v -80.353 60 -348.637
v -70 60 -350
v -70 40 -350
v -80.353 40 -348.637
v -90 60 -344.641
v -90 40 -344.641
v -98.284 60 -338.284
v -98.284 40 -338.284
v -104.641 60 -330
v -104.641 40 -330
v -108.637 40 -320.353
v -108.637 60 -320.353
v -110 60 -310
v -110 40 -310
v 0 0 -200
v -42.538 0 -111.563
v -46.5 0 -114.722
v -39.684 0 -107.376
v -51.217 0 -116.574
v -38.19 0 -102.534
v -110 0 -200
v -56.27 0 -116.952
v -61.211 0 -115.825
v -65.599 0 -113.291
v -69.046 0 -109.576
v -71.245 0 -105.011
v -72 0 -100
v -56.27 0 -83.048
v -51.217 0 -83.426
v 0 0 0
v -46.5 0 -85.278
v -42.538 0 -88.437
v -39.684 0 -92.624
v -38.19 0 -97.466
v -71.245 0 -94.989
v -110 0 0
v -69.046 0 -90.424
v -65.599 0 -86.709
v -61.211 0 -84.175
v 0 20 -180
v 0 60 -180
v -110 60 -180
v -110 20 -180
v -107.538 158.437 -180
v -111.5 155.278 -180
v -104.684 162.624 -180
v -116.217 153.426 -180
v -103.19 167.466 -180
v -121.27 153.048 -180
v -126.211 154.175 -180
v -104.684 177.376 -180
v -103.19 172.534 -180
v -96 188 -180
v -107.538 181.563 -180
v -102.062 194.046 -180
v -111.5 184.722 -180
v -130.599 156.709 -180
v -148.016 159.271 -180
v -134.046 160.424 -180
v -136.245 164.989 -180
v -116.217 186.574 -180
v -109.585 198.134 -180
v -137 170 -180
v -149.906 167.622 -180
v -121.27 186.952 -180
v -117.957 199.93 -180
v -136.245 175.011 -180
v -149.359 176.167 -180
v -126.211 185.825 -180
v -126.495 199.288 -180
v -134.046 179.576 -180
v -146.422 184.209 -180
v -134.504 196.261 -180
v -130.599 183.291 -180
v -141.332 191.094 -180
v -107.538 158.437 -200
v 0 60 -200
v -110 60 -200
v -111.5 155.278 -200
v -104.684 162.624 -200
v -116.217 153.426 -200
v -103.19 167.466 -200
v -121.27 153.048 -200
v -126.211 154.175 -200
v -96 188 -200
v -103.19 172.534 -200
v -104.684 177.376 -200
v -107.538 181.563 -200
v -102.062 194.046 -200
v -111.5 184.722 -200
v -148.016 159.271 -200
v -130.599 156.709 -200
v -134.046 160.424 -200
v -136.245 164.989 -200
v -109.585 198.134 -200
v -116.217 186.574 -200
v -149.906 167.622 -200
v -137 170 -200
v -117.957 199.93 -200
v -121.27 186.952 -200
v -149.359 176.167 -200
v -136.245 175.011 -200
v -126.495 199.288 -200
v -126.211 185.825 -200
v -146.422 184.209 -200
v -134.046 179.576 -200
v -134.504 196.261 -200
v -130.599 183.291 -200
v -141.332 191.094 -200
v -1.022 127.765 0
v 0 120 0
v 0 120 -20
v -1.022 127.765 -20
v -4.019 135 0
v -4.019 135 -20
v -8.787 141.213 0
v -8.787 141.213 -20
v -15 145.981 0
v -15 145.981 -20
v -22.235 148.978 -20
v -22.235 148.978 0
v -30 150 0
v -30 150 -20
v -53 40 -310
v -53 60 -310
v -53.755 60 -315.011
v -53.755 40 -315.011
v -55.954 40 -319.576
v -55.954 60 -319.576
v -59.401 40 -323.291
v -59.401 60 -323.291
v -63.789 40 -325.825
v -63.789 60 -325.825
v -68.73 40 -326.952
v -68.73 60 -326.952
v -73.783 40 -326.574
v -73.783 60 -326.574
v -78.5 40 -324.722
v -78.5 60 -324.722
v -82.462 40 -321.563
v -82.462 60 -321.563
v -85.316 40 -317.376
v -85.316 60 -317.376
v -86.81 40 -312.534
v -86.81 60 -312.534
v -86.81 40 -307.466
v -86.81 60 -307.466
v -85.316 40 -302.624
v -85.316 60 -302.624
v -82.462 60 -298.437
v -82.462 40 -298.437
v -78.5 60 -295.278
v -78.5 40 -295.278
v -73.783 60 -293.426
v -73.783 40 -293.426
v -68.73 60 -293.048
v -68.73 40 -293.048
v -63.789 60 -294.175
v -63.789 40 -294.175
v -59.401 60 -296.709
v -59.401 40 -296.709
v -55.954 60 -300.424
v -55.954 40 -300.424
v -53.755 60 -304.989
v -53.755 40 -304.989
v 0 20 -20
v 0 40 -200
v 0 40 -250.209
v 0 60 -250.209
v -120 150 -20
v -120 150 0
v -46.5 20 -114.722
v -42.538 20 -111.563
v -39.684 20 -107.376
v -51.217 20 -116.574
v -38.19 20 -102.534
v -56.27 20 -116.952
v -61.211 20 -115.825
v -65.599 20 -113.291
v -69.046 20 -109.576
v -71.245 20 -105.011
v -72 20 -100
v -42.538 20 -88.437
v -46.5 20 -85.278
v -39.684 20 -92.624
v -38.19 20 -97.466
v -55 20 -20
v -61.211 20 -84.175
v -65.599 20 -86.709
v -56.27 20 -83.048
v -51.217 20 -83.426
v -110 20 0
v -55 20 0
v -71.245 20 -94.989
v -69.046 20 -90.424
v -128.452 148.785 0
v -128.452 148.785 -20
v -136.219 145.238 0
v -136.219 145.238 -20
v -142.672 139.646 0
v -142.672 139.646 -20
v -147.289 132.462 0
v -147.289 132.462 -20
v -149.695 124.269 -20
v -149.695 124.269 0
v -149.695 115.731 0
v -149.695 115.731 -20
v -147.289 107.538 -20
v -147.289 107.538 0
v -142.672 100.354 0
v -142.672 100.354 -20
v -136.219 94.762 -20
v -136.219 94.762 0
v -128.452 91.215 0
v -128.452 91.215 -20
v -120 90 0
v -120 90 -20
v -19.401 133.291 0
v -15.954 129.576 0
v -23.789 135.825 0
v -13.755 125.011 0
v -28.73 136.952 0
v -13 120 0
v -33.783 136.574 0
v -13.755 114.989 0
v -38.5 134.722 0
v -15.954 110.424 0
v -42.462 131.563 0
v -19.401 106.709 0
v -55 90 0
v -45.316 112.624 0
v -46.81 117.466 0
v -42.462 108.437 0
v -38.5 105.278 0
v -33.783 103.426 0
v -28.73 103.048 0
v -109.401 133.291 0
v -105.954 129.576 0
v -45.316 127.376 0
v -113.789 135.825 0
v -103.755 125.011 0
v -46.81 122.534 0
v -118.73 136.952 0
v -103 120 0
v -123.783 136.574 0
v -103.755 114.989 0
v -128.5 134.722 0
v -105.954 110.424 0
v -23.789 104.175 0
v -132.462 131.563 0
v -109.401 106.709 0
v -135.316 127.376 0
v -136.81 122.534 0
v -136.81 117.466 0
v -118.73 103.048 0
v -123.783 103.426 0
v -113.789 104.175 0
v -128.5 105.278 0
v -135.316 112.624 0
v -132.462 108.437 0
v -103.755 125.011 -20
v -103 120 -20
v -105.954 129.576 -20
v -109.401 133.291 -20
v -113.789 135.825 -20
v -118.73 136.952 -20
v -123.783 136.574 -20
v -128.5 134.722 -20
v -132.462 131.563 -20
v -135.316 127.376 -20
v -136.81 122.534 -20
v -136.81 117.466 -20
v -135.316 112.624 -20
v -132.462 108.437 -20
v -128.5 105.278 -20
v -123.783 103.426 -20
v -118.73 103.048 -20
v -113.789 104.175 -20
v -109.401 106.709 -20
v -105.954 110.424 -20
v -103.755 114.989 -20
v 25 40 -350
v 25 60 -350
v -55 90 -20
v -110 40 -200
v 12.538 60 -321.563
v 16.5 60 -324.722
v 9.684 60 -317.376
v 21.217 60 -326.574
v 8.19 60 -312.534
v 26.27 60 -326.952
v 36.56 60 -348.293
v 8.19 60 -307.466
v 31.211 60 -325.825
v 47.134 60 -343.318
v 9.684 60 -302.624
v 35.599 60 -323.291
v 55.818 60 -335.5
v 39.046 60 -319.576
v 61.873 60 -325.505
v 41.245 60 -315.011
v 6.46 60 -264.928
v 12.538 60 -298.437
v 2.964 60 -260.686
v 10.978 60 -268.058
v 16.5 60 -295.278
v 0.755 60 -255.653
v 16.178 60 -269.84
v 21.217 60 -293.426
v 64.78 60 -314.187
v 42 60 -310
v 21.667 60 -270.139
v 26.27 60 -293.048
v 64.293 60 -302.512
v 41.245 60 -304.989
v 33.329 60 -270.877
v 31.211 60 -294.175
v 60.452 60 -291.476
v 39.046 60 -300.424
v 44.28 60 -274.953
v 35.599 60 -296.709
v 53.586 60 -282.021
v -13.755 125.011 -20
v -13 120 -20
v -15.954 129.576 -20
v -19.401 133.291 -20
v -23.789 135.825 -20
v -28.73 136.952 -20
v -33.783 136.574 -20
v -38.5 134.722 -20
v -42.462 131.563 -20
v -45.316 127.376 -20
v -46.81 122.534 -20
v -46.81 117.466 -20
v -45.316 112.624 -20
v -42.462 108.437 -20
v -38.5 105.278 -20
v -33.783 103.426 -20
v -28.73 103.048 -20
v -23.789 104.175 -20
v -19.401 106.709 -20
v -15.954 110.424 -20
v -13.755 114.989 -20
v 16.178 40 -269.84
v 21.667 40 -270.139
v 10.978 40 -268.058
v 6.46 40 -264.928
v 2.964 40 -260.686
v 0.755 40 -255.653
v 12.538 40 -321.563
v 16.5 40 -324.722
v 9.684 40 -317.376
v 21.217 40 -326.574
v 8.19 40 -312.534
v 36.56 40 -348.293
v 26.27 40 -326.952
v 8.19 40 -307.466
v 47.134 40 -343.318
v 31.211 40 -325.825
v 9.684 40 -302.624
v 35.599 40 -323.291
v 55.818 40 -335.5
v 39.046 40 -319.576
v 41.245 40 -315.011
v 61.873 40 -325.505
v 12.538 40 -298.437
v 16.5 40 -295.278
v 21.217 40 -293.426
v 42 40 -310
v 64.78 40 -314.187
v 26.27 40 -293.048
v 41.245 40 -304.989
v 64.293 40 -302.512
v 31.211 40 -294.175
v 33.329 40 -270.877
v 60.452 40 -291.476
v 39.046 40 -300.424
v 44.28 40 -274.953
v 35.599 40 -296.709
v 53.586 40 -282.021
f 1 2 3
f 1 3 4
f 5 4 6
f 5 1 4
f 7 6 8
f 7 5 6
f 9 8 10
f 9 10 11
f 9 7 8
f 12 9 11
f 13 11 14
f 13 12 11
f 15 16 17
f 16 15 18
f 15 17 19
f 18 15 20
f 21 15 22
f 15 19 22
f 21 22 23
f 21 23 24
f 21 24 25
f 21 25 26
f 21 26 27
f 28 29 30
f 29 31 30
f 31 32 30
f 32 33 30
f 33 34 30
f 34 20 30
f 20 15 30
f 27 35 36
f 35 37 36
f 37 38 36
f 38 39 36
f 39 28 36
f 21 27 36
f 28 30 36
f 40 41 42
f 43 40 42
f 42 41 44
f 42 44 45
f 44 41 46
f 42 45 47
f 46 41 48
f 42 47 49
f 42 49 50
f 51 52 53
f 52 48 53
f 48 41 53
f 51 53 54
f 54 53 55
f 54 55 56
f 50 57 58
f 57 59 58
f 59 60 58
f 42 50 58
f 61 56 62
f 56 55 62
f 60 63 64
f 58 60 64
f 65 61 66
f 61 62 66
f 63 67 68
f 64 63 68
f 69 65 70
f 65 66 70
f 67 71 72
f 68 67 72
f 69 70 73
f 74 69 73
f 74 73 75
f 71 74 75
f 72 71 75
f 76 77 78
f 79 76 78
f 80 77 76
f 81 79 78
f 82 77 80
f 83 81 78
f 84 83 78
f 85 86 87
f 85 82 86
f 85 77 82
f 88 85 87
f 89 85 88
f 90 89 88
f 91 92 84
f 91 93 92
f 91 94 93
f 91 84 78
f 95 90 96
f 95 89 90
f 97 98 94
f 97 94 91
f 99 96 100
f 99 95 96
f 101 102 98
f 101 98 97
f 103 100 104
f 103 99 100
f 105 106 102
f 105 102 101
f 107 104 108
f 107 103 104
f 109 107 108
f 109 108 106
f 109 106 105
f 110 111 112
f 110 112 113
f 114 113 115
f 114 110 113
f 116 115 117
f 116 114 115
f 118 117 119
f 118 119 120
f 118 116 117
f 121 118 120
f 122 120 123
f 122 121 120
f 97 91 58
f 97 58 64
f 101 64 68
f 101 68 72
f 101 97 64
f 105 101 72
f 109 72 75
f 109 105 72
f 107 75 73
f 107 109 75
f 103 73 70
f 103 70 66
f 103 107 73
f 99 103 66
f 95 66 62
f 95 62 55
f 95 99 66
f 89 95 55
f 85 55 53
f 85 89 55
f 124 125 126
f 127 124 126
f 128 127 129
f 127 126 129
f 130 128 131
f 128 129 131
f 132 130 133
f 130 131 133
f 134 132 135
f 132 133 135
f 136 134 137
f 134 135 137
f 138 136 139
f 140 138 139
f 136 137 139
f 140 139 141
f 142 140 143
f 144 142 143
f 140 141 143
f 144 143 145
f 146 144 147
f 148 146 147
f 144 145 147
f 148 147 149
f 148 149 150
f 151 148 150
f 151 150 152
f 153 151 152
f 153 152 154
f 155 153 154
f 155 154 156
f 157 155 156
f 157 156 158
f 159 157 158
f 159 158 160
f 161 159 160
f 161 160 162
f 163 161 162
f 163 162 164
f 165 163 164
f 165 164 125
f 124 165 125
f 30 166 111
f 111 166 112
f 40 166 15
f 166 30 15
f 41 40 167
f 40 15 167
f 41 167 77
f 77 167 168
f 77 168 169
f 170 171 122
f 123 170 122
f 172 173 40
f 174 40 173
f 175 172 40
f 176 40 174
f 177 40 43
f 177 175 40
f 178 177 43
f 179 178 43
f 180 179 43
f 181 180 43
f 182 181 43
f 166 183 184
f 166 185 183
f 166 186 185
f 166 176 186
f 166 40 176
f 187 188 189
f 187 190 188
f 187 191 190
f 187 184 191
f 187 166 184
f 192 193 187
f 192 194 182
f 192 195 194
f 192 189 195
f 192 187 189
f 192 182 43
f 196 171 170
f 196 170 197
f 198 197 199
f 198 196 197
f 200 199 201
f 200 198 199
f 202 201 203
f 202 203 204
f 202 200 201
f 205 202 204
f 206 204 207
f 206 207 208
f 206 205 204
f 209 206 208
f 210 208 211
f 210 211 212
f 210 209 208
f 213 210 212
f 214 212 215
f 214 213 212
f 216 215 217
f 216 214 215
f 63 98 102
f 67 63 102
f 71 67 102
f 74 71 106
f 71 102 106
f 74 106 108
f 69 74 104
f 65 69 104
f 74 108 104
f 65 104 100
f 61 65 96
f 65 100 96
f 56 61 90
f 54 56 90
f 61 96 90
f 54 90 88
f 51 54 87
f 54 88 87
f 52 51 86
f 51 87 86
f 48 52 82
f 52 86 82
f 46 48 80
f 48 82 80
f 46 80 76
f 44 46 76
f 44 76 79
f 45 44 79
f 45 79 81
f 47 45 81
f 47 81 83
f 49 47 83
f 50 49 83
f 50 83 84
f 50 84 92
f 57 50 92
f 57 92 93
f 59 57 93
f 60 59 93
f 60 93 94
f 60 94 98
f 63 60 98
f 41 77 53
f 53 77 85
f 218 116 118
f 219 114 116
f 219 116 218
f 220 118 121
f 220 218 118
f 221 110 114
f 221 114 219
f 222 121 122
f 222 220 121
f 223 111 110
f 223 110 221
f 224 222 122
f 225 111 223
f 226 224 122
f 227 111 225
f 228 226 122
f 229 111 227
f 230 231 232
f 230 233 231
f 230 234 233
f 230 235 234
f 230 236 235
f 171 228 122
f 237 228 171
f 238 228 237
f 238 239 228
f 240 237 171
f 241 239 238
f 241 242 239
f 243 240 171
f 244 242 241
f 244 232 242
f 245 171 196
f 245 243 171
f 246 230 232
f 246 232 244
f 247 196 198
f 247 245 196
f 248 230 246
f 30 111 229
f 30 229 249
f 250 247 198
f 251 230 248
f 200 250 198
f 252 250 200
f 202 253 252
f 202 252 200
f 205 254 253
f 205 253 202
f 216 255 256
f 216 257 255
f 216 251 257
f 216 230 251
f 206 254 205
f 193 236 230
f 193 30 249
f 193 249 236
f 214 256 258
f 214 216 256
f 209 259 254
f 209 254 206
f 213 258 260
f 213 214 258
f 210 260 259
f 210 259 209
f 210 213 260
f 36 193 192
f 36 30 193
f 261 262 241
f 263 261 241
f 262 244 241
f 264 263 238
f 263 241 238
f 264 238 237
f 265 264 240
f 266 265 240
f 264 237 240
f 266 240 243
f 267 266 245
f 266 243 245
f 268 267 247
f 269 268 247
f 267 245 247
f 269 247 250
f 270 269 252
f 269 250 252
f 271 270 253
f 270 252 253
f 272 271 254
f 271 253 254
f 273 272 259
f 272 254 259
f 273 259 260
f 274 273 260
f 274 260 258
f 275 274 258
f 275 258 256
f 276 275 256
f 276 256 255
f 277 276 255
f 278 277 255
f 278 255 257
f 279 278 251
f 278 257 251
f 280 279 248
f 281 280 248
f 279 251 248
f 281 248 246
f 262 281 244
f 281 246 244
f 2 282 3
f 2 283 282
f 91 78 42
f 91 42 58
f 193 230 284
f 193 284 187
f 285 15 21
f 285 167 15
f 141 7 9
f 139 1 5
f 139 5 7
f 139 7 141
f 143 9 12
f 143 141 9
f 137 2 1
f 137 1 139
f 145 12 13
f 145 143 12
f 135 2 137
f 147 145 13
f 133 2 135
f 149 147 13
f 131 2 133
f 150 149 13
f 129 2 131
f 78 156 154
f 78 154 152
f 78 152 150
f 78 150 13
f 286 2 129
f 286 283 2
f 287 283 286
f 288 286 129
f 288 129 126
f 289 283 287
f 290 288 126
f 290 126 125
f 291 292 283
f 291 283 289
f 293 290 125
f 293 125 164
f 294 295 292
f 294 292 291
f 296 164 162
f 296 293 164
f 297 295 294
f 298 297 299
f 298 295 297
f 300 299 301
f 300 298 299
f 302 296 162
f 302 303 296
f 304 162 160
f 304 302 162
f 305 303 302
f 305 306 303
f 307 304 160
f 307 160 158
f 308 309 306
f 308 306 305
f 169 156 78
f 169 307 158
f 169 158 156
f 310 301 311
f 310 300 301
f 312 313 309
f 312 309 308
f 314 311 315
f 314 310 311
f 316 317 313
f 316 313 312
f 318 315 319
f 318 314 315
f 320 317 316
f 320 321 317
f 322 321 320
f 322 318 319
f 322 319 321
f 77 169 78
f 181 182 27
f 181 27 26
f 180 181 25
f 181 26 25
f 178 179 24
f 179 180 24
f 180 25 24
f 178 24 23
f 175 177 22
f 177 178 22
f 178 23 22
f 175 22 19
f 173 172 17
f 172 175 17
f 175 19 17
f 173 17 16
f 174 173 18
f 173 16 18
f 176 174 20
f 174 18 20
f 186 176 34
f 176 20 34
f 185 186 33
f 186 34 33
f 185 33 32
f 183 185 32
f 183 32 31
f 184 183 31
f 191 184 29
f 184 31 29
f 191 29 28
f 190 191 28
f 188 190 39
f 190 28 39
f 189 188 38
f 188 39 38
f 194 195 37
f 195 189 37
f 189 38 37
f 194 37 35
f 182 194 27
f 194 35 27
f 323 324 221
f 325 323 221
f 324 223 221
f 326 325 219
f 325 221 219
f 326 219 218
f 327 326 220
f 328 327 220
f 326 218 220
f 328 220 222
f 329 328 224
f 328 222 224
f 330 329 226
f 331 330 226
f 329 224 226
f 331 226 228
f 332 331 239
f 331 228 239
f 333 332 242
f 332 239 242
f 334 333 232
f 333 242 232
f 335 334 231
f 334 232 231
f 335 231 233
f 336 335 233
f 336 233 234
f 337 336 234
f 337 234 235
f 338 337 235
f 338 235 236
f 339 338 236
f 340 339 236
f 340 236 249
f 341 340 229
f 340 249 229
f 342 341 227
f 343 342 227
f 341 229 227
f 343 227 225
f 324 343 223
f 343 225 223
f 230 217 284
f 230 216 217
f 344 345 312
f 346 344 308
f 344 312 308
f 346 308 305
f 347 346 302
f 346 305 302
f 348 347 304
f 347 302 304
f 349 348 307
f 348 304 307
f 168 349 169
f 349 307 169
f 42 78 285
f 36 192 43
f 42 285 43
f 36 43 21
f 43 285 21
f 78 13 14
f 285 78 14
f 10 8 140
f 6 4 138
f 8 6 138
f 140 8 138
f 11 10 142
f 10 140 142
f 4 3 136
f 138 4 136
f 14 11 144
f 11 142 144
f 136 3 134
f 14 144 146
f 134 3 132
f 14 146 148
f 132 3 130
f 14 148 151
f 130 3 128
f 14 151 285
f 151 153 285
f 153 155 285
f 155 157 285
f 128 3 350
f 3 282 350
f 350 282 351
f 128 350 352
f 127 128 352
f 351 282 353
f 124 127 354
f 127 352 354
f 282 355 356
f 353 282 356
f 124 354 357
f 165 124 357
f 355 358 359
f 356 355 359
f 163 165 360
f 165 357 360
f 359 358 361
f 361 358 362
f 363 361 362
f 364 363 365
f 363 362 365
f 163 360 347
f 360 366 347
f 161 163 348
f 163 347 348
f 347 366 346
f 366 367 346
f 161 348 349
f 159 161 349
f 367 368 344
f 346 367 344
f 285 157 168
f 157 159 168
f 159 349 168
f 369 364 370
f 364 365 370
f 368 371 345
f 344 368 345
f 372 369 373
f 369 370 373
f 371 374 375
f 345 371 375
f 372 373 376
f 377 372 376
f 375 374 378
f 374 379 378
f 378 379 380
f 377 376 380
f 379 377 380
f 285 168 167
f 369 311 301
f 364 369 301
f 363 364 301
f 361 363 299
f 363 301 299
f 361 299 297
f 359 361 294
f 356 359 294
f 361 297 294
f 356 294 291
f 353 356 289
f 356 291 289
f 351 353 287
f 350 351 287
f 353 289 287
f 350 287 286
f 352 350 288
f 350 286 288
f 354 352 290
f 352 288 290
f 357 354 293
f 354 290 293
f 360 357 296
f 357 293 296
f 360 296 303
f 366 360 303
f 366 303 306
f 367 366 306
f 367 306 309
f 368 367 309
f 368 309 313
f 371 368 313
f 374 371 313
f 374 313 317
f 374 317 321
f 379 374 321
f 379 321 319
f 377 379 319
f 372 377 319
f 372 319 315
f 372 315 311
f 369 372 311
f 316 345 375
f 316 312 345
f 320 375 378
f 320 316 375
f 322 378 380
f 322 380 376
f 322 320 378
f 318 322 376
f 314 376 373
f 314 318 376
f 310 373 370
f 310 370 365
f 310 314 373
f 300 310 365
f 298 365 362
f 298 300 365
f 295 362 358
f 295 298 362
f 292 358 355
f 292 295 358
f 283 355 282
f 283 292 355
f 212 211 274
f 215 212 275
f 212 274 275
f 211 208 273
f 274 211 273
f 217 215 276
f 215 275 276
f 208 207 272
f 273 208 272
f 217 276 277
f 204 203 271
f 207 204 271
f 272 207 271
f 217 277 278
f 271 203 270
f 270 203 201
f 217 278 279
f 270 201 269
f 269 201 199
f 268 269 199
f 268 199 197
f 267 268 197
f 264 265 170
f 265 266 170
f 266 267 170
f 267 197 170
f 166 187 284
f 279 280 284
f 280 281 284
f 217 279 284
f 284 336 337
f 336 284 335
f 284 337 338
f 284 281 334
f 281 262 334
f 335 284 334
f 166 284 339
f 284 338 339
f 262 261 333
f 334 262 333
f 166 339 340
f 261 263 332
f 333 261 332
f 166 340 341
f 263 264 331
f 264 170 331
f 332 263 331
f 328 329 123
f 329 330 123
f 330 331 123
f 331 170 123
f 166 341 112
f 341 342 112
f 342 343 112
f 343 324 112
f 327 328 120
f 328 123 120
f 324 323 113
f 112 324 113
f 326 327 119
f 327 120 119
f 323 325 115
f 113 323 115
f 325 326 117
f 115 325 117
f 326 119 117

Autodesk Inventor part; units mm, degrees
ref_plane "YZ Plane" through (0, 0, 0) normal (1, 0, 0) x (0, 1, 0)
ref_plane "XZ Plane" through (0, 0, 0) normal (0, 1, 0) x (-1, 0, 0)
ref_plane "XY Plane" through (0, 0, 0) normal (0, 0, 1) x (1, 0, 0)
sketch "Boceto1" plane through (0, 0, 0) normal (0, 1, 0) x (-1, 0, 0)
  line L0 (0, 0) -> (110, 0)
  line L1 (110, 0) -> (110, -200)
  line L2 (110, -200) -> (0, -200)
  line L3 (0, -200) -> (0, 0)
  circle A0 centre (55, -100) radius 17
  dimension "d0" = 110
  dimension "d1" = 200
extrude "Extrusión1" add sketch "Boceto1" along normal blind 20
sketch "Boceto2" plane through (-110, 0, 0) normal (0, 0, 1) x (1, 0, 0)
  line L0 (110, 20) -> (0, 20) projected
  line L1 (0, 20) -> (55, 20)
  line L2 (110, 0) -> (0, 0) projected
  line L3 (110, 20) -> (110, 120)
  circle A0 centre (80, 120) radius 17
  arc A1 (110, 120) -> (80, 150) centre (80, 120) ccw
  circle A2 centre (-10, 120) radius 17
  arc A3 (-10, 150) -> (-10, 90) centre (-10, 120) ccw
  line L4 (-10, 90) -> (55, 90)
  line L5 (55, 90) -> (55, 20)
  line L6 (-10, 150) -> (80, 150)
  dimension "d8" = 55
extrude "Extrusión2" add sketch "Boceto2" against normal blind 20
sketch "Boceto3" plane through (0, 0, -200) normal (0, 0, -1) x (-1, 0, 0)
  line L0 (110, 20) -> (0, 20)
  line L1 (0, 20) -> (0, 60)
  line L2 (0, 60) -> (110, 60)
  line L3 (110, 60) -> (110, 20)
  point P0 (0, 0)
  dimension "d19" = 110
  dimension "d20" = 40
extrude "Extrusión3" add sketch "Boceto3" against normal blind 20
sketch "Boceto4" plane through (0, 0, -200) normal (0, 0, -1) x (-1, 0, 0)
  line L0 (0, 0) -> (110, 0) projected
  line L1 (110, 0) -> (110, 60) projected
  circle A0 centre (120, 170) radius 17
  arc A1 (148.016, 159.2713) -> (96, 188) centre (120, 170) ccw
  line L2 (110, 60) -> (148.016, 159.2713)
  line L3 (0, 60) -> (96, 188)
  line L4 (0, 60) -> (110, 60) projected
  line L5 (0, 60) -> (110, 60)
extrude "Extrusión4" add sketch "Boceto4" against normal blind 20
sketch "Boceto5" plane through (0, 0, 0) normal (1, 0, 0) x (0, 0, -1)
  line L0 (0, 0) -> (200, 0) projected
  line L1 (200, 0) -> (200, 60) projected
  line L2 (200, 60) -> (180, 60) projected
  line L3 (180, 20) -> (180, 60) projected
  line L4 (20, 20) -> (180, 20) projected
  line L5 (20, 120) -> (20, 20) projected
  line L6 (0, 120) -> (20, 120) projected
  line L7 (0, 0) -> (0, 120) projected
  line L8 (180, 20) -> (180, 60) projected
  line L9 (180, 60) -> (310, 60)
  line L10 (310, 60) -> (310, 40)
  line L11 (310, 40) -> (180, 40)
  line L12 (180, 40) -> (180, 60)
  dimension "d30" = 130
  dimension "d31" = 20
extrude "Extrusión5" add sketch "Boceto5" against normal blind 110 contours L11 L3 L2 L1 | L1 L9 L10 L11
sketch "Boceto6" plane through (0, 60, -200) normal (0, 1, 0) x (1, 0, 0)
  line L0 (0, 0) -> (-110, 0) projected
  line L1 (0, 110) -> (0, 0) projected
  line L2 (0, 110) -> (-110, 110) projected
  line L3 (-110, 0) -> (-110, 110) projected
  line L4 (-96, 0) -> (0, 0) projected
  line L5 (0, 0) -> (0, 110) projected
  line L6 (0, 0) -> (0, 50.2087)
  line L7 (0, 110) -> (-70, 110)
  line L8 (0, 110) -> (-110, 110) projected
  circle A0 centre (-70, 110) radius 17
  arc A1 (-70, 150) -> (-110, 110) centre (-70, 110) ccw
  arc A2 (21.6667, 70.1391) -> (25, 150) centre (25, 110) ccw
  circle A3 centre (25, 110) radius 17
  line L9 (25, 150) -> (-70, 150)
  arc A4 (21.6667, 70.1391) -> (0, 50.2087) centre (20, 50.2087) ccw
  line L10 (-110, 110) -> (-110, 0) projected
  line L11 (-110, 110) -> (-110, 50.2087)
  line L12 (-110, 50.2087) -> (0, 50.2087)
  point P0 (0, -200)
  point P1 (0, 78.775)
  point P2 (-110, 50.2087)
  point P3 (-87, 110)
  point P4 (-53, 110)
  dimension "d41" = 20
extrude "Extrusión6" add sketch "Boceto6" against normal blind 20 contours L12 L3 L2 A0 L1 | L1 L2 A0 A1 L9 A2 A4
extrude "Extrusión7" cut sketch "Boceto6" against normal blind 20 contours A0 L2 picked at (-58.8313, 108.6439)
properties part number "Pieza4Miniproyecto"
